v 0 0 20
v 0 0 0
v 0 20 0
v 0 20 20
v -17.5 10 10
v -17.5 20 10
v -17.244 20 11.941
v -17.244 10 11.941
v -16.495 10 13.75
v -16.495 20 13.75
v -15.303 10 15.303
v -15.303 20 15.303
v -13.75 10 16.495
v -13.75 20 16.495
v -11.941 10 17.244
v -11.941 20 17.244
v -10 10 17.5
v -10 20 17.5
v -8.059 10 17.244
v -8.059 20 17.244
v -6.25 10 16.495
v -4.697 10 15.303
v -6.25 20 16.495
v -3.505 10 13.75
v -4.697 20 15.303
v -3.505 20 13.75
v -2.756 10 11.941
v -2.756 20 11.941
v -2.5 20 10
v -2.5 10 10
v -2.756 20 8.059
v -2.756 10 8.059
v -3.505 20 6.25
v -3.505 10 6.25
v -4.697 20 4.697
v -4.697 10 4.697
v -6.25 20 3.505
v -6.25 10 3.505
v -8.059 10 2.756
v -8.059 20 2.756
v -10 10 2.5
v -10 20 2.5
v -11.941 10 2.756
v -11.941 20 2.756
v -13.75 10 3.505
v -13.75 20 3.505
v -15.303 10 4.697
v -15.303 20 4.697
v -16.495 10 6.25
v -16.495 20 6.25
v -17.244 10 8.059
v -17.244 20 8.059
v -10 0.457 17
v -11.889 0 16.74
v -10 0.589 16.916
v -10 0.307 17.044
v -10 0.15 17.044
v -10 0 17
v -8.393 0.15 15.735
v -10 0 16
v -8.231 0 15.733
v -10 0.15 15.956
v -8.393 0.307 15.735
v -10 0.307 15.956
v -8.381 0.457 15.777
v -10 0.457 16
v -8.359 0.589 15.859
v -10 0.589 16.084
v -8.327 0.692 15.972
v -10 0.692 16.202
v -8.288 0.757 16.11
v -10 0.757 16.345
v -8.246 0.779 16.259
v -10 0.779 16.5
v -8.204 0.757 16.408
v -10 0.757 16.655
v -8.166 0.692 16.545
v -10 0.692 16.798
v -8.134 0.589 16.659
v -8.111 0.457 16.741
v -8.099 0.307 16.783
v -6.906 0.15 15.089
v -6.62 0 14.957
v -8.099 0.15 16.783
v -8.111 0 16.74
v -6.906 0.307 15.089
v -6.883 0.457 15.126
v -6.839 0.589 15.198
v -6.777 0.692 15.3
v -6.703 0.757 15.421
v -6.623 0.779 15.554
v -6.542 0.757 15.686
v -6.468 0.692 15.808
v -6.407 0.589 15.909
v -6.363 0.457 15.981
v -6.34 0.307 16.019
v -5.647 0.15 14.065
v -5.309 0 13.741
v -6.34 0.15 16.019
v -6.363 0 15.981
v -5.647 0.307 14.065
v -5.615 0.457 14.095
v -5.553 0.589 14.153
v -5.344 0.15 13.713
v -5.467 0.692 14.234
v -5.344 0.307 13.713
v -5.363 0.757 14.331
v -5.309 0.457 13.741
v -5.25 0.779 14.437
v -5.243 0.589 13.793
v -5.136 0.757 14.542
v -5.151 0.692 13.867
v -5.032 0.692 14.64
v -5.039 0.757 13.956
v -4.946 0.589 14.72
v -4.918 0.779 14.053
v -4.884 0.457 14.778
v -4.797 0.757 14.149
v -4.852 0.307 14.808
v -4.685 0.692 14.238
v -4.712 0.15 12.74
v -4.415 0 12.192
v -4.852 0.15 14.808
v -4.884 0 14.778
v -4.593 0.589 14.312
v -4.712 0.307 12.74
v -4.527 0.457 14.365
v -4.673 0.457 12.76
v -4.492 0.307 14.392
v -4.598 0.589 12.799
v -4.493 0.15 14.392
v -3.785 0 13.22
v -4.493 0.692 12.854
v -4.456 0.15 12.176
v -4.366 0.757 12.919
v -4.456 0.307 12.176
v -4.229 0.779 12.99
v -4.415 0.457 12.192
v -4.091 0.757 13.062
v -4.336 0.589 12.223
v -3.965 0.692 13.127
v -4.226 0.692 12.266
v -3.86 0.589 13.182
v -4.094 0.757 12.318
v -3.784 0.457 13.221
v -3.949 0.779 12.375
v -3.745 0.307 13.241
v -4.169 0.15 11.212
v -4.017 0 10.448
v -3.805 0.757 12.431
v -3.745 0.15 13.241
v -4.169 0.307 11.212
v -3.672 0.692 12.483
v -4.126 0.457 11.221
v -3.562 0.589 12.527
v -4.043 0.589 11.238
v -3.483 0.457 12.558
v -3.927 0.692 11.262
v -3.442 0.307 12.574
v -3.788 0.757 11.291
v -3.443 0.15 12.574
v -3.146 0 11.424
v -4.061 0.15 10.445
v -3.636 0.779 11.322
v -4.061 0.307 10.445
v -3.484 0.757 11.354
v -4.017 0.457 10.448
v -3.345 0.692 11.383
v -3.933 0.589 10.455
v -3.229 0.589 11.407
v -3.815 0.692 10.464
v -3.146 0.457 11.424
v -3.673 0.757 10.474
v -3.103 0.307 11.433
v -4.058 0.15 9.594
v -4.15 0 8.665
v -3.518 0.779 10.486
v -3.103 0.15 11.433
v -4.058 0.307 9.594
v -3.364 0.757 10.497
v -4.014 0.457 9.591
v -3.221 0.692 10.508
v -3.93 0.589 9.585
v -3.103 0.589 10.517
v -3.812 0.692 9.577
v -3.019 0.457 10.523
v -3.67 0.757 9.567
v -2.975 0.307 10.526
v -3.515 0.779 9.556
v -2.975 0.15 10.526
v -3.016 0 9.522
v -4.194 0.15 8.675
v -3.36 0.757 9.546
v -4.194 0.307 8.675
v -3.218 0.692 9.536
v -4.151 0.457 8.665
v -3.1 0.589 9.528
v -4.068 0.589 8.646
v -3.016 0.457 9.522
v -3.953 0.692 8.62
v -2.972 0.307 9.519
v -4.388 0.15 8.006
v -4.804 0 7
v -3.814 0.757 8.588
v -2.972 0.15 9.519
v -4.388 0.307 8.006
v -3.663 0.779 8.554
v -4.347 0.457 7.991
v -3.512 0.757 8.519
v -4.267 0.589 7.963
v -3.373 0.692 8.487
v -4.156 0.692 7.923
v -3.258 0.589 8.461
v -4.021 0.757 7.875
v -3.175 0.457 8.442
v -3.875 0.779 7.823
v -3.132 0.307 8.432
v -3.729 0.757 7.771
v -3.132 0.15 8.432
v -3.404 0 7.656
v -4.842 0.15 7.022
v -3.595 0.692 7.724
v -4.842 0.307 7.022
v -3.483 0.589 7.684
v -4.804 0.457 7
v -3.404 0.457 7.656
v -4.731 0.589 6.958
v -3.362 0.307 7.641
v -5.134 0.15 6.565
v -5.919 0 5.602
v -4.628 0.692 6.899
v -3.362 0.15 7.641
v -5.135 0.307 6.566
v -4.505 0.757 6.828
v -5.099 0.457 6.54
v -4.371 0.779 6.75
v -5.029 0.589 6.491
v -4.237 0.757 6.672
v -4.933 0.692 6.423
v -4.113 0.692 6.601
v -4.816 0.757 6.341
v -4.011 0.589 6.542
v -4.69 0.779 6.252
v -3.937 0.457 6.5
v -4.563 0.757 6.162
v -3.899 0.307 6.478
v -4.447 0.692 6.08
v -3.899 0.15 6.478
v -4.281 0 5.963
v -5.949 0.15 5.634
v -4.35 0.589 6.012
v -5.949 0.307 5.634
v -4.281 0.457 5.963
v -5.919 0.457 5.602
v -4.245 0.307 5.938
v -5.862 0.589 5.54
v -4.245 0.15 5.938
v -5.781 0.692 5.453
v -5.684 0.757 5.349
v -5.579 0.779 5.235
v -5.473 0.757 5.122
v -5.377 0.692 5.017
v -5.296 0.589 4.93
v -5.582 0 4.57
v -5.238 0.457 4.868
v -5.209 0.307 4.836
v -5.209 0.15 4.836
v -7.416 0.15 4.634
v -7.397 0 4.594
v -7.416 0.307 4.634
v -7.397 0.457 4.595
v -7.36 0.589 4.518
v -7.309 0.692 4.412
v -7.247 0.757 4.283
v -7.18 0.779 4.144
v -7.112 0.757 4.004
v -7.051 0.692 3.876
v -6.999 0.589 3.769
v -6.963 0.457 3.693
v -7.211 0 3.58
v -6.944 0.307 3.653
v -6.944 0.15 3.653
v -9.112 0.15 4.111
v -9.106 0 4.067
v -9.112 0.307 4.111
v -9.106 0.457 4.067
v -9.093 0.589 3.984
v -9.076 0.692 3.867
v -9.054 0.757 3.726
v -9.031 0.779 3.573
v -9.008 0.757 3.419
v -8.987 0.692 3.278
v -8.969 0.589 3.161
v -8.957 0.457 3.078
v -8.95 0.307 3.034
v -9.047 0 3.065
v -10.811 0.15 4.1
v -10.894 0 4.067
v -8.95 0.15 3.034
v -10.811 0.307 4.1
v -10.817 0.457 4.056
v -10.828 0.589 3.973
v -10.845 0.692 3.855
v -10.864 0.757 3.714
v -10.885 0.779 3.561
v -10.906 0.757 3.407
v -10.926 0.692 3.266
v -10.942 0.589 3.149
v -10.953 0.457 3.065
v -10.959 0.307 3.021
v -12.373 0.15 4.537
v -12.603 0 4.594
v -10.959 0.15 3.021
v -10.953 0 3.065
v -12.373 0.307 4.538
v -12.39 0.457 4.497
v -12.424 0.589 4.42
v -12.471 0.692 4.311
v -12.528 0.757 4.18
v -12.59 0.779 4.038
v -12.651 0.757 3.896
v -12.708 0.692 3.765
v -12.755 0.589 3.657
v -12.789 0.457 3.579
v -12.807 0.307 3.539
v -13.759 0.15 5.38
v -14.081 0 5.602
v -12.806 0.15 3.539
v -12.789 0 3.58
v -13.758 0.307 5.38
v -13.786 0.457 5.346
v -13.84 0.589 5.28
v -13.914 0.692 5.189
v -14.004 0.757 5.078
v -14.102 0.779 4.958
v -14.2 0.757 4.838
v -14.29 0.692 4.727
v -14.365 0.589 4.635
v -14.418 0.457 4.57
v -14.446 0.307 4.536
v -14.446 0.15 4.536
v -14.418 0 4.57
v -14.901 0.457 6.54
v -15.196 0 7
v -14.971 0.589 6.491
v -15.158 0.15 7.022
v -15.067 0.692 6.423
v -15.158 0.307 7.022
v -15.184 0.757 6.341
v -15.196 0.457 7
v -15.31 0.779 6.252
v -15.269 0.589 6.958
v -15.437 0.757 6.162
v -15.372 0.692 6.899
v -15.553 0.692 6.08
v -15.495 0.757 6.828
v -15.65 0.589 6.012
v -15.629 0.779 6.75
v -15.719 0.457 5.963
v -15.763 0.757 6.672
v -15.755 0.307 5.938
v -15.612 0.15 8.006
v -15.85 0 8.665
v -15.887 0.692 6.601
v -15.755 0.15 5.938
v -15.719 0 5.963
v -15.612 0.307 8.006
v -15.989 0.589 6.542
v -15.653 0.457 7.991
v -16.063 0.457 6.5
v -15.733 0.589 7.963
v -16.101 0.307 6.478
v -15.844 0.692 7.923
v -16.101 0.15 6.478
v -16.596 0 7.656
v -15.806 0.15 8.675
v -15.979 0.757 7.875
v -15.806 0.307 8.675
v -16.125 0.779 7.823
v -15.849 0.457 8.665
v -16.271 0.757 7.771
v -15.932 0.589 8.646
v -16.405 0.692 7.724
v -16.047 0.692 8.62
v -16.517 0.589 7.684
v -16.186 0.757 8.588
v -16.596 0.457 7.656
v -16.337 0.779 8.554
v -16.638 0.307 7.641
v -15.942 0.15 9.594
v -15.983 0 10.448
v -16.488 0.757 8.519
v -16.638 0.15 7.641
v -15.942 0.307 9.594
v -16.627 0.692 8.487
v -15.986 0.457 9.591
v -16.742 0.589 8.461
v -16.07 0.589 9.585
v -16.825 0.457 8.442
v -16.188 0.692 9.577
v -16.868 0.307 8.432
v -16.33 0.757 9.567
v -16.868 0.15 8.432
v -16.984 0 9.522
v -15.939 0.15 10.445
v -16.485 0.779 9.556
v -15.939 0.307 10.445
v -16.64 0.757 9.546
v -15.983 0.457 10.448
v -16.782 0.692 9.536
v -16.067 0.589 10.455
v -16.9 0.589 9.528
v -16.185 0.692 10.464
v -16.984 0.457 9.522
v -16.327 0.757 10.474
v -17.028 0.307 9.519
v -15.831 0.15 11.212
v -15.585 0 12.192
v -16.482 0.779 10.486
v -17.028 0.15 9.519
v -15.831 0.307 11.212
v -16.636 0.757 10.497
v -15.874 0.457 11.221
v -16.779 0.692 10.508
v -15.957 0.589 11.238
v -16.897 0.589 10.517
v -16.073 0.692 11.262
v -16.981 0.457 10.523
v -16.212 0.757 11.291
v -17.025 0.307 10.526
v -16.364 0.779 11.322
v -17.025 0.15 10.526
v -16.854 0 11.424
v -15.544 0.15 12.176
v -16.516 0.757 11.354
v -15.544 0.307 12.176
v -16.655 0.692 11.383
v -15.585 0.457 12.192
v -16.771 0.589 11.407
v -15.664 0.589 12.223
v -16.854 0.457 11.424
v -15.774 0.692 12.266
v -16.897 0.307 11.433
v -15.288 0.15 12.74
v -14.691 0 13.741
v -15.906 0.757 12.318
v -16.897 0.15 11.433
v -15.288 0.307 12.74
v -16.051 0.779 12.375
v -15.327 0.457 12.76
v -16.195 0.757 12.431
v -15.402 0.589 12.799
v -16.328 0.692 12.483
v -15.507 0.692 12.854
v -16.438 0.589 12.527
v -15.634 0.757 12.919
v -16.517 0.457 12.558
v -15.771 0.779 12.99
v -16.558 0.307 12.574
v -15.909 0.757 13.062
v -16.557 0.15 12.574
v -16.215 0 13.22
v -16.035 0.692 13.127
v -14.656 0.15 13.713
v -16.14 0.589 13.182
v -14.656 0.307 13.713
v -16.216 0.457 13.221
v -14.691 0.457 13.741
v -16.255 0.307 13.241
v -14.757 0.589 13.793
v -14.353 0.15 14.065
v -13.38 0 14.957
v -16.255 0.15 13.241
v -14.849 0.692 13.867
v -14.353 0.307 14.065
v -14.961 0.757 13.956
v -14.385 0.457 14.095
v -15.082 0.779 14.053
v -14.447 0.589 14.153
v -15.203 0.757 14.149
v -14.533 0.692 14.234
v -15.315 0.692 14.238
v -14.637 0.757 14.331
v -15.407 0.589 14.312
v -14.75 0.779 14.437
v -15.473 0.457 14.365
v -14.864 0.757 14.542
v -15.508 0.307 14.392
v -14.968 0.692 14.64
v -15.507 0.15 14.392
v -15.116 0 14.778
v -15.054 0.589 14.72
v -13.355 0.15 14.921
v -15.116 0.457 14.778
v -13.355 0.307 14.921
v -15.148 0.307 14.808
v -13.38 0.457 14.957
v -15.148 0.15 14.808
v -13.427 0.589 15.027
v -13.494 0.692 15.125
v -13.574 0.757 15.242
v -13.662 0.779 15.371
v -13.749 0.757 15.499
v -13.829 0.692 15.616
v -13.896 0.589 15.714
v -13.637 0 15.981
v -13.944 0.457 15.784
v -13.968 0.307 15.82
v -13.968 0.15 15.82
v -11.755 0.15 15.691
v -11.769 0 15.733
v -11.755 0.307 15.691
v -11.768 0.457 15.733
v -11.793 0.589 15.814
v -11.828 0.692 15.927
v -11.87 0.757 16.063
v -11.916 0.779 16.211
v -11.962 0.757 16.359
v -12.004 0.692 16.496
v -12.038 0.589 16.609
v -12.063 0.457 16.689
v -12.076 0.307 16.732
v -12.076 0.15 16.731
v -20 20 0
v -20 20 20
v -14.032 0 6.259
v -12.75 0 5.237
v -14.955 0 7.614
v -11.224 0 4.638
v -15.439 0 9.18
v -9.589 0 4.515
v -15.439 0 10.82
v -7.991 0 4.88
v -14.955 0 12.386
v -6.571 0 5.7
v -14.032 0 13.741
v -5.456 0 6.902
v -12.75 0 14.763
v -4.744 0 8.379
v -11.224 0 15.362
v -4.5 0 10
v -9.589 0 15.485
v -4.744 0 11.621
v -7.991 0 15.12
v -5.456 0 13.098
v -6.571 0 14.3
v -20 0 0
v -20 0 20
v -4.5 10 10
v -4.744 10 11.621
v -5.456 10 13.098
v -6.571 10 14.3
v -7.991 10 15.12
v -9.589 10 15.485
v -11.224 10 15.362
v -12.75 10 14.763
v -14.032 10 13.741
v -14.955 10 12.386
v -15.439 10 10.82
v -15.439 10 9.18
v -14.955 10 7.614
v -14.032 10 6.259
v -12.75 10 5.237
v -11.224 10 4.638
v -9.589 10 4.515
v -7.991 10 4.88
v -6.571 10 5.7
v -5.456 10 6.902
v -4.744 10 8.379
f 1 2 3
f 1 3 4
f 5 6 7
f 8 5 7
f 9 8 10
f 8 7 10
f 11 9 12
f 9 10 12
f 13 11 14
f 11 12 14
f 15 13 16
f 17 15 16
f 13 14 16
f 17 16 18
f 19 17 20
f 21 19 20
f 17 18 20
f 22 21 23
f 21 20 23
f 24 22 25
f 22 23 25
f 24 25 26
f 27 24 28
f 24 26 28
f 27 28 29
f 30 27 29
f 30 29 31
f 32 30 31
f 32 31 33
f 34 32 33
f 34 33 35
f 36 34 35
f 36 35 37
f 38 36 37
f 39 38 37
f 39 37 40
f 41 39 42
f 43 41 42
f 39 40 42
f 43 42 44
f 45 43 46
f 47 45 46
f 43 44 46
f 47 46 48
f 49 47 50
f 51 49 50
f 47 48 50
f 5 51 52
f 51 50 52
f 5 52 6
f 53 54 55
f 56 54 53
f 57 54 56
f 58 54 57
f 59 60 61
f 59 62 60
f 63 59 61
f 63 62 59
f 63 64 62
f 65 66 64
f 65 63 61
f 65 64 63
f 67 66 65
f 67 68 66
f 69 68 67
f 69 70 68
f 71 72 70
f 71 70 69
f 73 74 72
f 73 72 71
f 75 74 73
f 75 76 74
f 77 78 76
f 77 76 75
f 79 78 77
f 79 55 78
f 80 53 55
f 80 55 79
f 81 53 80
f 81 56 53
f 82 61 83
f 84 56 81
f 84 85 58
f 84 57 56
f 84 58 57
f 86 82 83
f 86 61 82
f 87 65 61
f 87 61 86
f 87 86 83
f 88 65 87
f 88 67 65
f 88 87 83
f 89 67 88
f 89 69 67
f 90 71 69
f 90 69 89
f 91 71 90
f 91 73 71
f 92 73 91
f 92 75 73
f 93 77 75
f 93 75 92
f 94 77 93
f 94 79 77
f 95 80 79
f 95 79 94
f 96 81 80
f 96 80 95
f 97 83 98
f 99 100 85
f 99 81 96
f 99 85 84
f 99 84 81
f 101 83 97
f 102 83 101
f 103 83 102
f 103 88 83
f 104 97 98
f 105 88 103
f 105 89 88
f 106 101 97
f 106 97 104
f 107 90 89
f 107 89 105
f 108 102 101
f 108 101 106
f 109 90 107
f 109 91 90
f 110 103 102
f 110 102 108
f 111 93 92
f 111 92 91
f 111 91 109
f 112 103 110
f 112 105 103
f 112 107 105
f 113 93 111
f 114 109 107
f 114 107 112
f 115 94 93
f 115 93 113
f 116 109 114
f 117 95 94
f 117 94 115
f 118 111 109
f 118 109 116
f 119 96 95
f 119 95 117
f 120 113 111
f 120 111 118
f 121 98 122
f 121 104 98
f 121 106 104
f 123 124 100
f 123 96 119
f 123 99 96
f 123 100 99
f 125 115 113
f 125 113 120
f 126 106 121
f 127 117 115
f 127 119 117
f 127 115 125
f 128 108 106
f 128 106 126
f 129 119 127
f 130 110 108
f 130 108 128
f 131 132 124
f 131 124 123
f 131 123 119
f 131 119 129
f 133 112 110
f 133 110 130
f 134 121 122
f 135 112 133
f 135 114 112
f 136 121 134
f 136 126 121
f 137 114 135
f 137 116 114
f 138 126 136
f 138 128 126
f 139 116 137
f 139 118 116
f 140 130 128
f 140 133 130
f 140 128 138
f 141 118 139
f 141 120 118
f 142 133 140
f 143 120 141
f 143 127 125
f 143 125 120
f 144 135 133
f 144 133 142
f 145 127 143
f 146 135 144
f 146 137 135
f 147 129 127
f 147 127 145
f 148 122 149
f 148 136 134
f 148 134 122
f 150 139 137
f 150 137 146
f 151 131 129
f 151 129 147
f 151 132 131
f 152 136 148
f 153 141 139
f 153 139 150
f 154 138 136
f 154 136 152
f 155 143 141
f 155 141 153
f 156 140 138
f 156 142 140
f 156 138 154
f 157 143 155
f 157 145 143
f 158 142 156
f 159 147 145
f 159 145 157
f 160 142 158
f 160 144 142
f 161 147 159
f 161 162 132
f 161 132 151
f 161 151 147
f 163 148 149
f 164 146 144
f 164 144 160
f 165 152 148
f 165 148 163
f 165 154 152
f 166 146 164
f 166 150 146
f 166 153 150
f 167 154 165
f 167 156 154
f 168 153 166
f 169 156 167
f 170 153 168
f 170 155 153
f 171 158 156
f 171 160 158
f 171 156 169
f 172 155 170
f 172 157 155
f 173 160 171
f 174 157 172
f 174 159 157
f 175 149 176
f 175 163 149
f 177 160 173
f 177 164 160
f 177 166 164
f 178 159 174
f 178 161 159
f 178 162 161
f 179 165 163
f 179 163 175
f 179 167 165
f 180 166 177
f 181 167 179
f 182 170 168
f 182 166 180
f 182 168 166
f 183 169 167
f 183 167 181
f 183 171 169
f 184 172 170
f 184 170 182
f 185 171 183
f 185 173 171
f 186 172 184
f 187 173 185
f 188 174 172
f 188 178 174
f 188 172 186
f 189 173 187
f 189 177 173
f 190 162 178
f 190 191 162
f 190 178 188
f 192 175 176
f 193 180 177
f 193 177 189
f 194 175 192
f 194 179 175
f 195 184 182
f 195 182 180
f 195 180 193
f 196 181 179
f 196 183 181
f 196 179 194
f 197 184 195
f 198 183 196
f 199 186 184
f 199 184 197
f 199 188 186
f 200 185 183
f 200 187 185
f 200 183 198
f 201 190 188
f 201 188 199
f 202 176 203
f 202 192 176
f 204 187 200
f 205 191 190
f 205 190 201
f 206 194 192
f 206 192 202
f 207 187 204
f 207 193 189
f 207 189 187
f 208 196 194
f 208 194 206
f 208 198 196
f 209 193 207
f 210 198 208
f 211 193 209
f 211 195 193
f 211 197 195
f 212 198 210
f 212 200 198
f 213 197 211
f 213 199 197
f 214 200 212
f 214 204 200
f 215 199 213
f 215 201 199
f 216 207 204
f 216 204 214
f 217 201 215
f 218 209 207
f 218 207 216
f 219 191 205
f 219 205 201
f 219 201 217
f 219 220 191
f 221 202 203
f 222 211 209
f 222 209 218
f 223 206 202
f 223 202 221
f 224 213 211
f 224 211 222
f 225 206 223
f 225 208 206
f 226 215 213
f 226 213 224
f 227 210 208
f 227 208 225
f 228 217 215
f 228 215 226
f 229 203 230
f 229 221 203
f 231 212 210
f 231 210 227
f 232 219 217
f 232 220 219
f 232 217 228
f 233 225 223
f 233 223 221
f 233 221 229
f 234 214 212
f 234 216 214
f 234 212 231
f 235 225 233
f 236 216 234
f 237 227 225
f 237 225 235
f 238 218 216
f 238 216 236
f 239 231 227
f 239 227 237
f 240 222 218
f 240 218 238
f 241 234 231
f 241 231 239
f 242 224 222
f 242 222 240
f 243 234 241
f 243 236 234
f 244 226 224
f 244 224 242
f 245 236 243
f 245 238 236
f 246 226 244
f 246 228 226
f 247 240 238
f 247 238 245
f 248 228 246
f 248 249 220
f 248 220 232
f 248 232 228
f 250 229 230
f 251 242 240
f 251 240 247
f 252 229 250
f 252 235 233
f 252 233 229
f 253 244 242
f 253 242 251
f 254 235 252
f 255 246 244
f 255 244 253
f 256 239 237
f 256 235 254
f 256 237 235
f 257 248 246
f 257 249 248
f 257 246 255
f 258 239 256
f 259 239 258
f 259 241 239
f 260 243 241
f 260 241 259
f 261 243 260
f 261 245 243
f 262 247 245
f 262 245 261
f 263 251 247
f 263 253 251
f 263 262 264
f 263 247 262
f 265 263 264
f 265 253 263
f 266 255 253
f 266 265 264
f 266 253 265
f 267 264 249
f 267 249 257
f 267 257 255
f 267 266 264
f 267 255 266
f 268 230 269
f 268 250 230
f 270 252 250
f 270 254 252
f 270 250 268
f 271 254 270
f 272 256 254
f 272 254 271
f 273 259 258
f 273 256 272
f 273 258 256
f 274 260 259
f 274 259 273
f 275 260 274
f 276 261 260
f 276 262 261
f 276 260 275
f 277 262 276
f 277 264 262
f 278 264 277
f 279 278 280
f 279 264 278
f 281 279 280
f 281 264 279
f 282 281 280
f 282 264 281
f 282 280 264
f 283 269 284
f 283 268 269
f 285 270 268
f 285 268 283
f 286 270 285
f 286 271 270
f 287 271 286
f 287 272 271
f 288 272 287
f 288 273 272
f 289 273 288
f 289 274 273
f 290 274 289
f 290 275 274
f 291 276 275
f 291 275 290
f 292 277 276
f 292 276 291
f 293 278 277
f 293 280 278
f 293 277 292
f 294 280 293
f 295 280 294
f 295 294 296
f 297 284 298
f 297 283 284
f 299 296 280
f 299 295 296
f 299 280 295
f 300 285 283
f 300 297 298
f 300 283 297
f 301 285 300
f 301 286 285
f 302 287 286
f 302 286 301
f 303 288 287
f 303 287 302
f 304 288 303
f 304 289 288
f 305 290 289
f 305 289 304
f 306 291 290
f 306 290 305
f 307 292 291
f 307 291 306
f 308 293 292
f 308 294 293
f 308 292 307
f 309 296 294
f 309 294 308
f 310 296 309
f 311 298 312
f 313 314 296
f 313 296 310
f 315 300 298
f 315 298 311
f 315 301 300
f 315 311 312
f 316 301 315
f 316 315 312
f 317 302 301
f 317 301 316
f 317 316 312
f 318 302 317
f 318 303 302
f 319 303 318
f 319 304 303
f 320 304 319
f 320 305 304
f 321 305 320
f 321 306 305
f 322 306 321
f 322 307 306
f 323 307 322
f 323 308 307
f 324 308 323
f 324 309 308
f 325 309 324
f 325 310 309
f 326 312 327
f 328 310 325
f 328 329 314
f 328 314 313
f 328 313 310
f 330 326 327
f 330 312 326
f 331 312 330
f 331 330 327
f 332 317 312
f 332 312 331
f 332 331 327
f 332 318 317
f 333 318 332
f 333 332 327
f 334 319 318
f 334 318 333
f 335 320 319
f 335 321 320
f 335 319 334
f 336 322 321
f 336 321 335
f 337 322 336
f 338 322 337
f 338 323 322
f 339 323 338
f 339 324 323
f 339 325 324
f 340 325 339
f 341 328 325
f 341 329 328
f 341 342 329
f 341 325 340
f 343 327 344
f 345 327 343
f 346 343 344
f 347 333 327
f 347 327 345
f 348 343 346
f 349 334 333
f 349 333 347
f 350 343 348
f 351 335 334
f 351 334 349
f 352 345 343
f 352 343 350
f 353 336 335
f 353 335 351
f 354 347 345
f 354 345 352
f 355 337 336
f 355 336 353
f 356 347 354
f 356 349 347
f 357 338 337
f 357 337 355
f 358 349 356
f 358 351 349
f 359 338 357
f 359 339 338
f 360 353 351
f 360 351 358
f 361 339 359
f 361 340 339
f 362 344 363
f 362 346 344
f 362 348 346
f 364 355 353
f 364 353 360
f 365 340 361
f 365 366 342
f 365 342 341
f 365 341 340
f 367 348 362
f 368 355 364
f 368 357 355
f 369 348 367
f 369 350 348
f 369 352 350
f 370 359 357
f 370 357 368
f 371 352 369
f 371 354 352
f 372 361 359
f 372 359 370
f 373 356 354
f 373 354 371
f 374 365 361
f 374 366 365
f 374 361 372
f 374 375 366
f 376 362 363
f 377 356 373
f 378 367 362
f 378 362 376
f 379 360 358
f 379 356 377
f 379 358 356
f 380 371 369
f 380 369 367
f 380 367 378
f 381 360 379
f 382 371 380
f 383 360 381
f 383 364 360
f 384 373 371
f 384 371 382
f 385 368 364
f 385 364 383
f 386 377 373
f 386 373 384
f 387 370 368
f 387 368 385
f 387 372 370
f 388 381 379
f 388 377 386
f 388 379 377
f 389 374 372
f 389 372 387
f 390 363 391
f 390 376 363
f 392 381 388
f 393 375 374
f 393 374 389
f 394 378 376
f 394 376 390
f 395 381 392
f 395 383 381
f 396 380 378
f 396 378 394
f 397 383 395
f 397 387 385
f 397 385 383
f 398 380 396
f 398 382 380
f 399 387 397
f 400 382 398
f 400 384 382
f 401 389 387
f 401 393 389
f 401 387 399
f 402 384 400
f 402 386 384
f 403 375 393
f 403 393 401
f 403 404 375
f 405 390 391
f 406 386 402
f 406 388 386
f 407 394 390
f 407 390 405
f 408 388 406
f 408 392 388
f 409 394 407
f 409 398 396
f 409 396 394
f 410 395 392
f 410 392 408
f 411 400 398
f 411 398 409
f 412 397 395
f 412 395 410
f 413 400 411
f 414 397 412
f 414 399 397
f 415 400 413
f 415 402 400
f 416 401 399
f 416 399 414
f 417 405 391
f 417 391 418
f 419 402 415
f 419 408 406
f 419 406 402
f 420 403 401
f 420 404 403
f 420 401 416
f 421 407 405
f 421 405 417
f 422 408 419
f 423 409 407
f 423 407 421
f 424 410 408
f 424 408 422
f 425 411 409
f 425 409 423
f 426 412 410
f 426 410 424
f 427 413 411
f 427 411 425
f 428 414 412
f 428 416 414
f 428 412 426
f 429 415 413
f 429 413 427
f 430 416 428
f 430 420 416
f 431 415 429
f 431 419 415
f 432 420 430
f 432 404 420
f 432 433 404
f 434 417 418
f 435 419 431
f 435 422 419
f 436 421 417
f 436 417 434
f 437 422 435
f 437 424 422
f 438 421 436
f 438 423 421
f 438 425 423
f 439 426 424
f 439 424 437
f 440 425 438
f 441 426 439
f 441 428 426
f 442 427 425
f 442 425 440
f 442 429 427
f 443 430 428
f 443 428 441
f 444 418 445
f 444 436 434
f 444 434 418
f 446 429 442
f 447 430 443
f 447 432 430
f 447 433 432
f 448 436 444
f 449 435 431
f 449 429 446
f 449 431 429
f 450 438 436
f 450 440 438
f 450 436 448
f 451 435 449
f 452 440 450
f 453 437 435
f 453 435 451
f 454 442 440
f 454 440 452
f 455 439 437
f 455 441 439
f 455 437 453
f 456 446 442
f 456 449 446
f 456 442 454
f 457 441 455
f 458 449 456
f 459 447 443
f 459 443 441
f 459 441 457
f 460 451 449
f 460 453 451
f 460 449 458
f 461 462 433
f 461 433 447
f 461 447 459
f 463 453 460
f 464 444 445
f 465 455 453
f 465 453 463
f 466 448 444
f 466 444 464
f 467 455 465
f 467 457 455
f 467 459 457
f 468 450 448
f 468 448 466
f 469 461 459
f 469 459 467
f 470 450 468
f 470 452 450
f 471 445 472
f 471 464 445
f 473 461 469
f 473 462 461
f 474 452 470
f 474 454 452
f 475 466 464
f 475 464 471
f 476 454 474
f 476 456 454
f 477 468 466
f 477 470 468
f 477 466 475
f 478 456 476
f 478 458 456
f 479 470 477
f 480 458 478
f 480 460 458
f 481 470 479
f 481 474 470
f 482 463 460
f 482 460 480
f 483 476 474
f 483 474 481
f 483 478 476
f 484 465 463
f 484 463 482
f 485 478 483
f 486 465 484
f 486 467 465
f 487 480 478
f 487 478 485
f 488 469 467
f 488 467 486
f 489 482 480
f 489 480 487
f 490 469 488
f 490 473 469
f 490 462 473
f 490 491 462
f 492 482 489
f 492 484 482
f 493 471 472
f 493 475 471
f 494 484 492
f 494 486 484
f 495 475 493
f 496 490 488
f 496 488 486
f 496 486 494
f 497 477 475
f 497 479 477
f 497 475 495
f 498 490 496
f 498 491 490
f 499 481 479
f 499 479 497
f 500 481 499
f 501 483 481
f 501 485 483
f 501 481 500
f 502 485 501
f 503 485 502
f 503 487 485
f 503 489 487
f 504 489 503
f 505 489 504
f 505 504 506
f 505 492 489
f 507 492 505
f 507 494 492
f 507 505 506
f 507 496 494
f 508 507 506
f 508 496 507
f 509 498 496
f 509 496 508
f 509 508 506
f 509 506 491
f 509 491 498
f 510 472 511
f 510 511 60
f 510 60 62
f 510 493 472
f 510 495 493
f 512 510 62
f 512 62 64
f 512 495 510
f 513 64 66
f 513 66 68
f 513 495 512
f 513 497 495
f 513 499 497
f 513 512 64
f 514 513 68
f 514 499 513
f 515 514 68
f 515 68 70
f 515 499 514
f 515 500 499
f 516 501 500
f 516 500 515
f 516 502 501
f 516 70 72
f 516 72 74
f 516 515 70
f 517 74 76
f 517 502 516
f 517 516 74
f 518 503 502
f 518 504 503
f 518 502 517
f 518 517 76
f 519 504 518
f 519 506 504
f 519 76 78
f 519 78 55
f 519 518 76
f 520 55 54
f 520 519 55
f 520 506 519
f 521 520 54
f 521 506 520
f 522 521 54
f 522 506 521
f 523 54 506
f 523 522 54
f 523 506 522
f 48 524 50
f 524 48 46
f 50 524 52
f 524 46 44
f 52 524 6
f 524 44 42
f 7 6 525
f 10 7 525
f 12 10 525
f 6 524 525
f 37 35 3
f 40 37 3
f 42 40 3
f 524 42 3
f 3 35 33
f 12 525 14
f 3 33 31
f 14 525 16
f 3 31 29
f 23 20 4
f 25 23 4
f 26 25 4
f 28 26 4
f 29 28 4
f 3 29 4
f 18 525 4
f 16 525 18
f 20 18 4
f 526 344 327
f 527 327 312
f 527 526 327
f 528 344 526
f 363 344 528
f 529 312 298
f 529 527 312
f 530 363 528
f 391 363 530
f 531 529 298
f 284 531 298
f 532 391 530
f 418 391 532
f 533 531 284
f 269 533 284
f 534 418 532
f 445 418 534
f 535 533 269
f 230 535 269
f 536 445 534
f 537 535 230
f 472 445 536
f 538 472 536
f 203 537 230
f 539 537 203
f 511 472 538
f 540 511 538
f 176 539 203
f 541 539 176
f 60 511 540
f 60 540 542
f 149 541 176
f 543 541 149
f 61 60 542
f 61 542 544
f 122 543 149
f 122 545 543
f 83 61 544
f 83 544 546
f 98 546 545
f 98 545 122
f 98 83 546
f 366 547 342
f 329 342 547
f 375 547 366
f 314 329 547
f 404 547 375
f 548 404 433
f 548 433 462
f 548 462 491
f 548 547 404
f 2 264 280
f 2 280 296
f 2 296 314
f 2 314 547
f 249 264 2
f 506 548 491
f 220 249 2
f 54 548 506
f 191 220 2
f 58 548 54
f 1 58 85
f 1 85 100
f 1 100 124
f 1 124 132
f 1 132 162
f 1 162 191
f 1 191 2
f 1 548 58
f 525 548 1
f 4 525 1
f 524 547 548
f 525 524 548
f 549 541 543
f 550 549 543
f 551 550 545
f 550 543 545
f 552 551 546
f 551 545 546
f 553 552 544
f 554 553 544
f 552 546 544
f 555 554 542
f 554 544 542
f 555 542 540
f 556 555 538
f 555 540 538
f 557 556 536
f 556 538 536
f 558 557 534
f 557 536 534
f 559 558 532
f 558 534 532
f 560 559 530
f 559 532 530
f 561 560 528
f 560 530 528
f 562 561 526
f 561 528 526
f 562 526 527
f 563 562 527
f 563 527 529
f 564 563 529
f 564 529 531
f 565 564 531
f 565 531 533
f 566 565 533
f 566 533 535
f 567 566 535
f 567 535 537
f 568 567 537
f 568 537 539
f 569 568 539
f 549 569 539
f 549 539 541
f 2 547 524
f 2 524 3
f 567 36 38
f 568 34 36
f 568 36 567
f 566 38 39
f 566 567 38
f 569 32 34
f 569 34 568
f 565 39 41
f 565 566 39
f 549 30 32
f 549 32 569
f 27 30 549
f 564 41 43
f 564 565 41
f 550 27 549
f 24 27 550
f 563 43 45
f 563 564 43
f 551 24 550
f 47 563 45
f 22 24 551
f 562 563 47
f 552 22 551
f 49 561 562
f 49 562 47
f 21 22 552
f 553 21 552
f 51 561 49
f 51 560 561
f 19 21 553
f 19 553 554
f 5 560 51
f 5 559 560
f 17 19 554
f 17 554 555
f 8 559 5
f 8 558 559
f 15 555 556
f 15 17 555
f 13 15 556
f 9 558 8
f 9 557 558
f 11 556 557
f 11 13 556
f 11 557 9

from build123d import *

# Parameters (mm, degrees)
F0_W     = 20
F0_H     = 20
F0_R     = 5.5
F1_DEPTH = 20
F5_R     = 7.5
F6_DEPTH = 10


with BuildPart() as f1:
    # F0 (on Front) → F1 (new body)
    with BuildSketch(Plane.XZ):
        with Locations((-10, 10)):
            Rectangle(F0_W, F0_H)
        with Locations((-10, 10)):
            Circle(F0_R, mode=Mode.SUBTRACT)
    extrude(amount=-F1_DEPTH)

    # F3 (on offset) → F4 (revolve, cut)
    with BuildSketch(Plane.YZ.offset(-10)):
        with BuildLine():
            ThreePointArc((0, 16), (0.7791287847, 16.5), (0, 17))
            Line((0, 17), (0, 16))
        make_face()
    revolve(axis=Axis((-10, 6.498338189, 10), (0, 1, 0)), mode=Mode.SUBTRACT)

    # F5 (on face) → F6 (cut)
    with BuildSketch(Plane(origin=(0, 20, 0), x_dir=(-1, 0, 0), z_dir=(0, 1, 0))):
        with Locations((10, 10)):
            Circle(F5_R)
    extrude(amount=-F6_DEPTH, mode=Mode.SUBTRACT)


solid = f1.part
